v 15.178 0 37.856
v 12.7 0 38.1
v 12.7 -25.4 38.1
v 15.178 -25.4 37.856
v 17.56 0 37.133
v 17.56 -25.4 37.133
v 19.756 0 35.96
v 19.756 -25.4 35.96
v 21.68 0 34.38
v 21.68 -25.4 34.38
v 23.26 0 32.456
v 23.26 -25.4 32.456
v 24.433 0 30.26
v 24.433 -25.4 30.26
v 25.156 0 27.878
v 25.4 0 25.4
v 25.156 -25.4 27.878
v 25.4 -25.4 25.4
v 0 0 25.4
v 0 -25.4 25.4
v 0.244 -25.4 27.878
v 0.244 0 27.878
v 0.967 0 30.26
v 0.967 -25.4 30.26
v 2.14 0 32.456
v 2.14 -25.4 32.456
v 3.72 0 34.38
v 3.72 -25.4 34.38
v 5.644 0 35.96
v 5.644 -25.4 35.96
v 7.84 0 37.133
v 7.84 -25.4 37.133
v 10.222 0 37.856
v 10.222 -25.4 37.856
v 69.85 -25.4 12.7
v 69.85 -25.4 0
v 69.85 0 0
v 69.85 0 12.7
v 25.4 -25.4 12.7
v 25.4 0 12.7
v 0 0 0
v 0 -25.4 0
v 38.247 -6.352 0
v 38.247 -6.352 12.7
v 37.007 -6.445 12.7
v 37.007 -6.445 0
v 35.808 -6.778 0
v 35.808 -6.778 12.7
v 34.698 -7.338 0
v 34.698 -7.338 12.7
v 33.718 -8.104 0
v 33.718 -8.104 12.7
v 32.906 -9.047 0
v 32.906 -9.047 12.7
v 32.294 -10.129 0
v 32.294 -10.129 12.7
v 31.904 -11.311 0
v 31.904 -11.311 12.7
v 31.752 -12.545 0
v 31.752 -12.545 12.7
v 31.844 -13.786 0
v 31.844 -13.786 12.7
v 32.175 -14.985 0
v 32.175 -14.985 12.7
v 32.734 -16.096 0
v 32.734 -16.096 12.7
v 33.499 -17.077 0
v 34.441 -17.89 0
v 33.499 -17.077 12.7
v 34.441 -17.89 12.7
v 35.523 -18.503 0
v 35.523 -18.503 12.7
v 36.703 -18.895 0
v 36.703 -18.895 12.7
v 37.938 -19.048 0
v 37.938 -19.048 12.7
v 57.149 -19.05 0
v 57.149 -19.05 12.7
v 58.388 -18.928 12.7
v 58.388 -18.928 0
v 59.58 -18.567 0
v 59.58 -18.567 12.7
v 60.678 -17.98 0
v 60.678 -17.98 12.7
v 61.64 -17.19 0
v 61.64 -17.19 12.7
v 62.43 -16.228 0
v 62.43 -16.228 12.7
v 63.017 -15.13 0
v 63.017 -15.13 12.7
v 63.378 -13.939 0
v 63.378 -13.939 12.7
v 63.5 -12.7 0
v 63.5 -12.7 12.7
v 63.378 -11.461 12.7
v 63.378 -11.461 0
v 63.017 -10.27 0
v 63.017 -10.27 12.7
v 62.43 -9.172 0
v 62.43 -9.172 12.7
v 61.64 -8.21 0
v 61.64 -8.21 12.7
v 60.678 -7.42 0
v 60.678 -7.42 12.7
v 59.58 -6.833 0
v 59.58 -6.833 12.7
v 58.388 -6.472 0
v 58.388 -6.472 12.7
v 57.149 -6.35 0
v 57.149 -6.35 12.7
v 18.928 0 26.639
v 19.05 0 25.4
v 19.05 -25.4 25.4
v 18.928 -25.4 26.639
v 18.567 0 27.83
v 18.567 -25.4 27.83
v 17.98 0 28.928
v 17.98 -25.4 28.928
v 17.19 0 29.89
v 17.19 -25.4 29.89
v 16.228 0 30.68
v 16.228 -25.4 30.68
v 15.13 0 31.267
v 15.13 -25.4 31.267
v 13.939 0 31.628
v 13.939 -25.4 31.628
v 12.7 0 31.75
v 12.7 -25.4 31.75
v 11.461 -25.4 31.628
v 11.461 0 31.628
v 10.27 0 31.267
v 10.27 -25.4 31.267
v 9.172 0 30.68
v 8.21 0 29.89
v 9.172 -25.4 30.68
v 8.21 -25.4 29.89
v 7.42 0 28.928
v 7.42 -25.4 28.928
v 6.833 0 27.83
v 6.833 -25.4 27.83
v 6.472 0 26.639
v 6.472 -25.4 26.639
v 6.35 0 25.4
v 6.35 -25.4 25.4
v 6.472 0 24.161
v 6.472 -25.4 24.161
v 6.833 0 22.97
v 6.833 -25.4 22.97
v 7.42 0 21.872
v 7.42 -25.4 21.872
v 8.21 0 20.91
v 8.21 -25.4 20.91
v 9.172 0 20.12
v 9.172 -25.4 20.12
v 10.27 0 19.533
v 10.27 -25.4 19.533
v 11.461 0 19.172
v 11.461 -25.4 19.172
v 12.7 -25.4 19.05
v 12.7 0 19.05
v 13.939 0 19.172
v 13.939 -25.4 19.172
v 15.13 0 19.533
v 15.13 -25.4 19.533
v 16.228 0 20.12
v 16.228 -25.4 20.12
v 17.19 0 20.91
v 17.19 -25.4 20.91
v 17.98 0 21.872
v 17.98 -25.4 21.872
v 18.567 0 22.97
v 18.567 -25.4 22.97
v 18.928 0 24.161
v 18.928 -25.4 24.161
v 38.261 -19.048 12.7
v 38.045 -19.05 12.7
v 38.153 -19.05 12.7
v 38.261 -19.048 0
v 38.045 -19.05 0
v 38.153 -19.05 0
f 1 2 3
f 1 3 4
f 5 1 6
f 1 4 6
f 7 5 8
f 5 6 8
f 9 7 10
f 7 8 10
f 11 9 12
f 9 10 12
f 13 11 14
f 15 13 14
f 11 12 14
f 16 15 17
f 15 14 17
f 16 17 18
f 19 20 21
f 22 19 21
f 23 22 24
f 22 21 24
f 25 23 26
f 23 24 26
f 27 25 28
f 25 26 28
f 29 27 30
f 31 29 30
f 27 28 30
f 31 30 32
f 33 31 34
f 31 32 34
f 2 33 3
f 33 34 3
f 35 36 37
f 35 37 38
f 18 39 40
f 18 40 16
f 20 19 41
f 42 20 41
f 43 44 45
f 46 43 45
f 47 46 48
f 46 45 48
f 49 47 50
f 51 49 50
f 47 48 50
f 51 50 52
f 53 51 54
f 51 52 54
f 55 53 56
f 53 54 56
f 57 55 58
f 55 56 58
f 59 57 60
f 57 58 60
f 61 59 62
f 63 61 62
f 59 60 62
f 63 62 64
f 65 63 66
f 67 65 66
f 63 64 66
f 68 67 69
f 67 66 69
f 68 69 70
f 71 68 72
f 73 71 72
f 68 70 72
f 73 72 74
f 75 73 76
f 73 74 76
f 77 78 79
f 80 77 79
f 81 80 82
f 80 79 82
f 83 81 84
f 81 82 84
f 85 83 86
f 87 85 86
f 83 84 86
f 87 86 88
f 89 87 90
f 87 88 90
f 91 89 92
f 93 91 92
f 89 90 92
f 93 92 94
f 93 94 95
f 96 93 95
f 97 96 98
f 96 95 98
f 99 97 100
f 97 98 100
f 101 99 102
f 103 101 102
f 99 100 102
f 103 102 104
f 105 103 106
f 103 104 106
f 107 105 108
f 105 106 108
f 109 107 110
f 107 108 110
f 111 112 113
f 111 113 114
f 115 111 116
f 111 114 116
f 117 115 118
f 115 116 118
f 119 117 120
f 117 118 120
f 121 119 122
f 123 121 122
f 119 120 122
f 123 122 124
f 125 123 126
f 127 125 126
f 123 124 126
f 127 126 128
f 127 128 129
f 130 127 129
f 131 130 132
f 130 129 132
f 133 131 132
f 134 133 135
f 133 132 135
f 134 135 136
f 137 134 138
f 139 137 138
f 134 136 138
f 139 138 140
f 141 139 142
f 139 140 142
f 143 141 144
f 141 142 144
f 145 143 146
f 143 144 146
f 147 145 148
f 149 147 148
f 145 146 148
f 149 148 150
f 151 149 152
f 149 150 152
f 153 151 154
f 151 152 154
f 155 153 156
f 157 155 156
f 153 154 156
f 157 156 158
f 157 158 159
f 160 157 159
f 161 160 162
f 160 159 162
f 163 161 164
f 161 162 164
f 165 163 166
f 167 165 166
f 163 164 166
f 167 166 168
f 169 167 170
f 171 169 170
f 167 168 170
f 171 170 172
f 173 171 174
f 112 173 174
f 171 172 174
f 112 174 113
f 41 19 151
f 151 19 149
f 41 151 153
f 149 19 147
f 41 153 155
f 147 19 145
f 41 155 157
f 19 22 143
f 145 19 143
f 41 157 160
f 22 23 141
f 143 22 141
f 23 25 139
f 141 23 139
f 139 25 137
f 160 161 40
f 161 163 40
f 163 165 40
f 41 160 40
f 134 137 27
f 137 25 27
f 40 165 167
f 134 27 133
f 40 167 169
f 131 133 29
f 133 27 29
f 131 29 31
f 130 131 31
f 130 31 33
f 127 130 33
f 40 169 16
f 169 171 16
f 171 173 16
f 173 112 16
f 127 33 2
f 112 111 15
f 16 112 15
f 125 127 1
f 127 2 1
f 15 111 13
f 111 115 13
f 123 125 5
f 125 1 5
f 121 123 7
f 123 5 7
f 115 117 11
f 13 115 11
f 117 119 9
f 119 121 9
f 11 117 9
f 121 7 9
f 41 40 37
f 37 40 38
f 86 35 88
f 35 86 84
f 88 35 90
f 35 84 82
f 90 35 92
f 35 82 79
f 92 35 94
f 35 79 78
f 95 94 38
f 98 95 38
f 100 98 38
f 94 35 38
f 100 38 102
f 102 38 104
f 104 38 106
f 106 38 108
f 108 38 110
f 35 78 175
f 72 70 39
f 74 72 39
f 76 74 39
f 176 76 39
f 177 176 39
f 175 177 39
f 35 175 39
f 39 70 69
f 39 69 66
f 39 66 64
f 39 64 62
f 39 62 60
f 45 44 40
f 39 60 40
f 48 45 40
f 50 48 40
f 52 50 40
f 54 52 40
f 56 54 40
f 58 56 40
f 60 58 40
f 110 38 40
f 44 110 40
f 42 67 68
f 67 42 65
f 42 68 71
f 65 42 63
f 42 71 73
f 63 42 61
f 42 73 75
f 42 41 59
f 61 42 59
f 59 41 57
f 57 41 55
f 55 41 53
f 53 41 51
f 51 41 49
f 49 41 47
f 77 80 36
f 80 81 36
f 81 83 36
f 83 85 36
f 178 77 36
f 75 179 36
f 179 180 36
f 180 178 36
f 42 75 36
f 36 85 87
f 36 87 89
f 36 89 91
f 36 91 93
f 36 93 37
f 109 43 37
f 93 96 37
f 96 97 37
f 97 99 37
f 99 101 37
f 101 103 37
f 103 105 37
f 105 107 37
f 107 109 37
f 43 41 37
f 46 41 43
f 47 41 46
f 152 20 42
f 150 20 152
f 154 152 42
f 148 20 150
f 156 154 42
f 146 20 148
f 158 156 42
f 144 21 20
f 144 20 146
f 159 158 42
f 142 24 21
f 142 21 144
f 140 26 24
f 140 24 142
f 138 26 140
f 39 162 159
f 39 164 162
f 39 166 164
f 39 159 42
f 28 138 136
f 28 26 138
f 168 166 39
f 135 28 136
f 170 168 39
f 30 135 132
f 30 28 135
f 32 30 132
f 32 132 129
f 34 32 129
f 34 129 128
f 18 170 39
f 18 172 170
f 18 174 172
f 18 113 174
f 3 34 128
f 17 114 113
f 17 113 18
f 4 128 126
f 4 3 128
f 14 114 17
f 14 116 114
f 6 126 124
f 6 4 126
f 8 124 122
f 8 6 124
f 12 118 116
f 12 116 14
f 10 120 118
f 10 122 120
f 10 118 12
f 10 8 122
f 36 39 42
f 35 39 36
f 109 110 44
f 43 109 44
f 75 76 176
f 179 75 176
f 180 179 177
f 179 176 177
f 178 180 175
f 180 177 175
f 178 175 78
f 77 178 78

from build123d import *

# Parameters (mm, degrees)
F1_DEPTH = 25.4
F2_R     = 6.35
F3_DEPTH = 25.4
F4_DEPTH = 25.4
F7_DEPTH = 12.7


with BuildPart() as f1:
    # F0 (on Front) → F1 (new body)
    with BuildSketch(Plane.XZ):
        Polygon((25.4, 38.1), (0, 38.1), (0, 0), (69.85, 0), (69.85, 12.7), (25.4, 12.7), align=None)
    extrude(amount=F1_DEPTH)

    # F2 (on face) → F3 (cut)
    with BuildSketch(Plane.XZ.offset(25.4)):
        with Locations((12.7, 25.4)):
            Circle(F2_R)
    extrude(amount=-F3_DEPTH, mode=Mode.SUBTRACT)

    # F2 (on face) → F4 (cut)
    with BuildSketch(Plane.XZ.offset(25.4)):
        with BuildLine():
            ThreePointArc((0, 25.4), (3.719744, 34.380256), (12.7, 38.1))
            Line((12.7, 38.1), (0, 38.1))
            Line((0, 38.1), (0, 25.4))
        make_face()
        with BuildLine():
            ThreePointArc((12.7, 38.1), (21.680256, 34.380256), (25.4, 25.4))
            Line((25.4, 25.4), (25.4, 38.1))
            Line((25.4, 38.1), (12.7, 38.1))
        make_face()
    extrude(amount=-F4_DEPTH, mode=Mode.SUBTRACT)

    # F6 (on face) → F7 (cut)
    with BuildSketch(Plane.XY.offset(12.7)):
        with BuildLine():
            ThreePointArc((38.260814, -19.047963), (42.646629, -17.132907), (44.45, -12.7))
            ThreePointArc((44.45, -12.7), (42.64191, -8.262258), (38.247307, -6.351709))
            ThreePointArc((38.247307, -6.351709), (31.751886, -12.545255), (37.937817, -19.047929))
            Line((37.937817, -19.047929), (38.260814, -19.047963))
        make_face()
        with BuildLine():
            ThreePointArc((38.247307, -6.351709), (42.64191, -8.262258), (44.45, -12.7))
            ThreePointArc((44.45, -12.7), (42.646629, -17.132907), (38.260814, -19.047963))
            Line((38.260814, -19.047963), (57.149315, -19.05))
            ThreePointArc((57.149315, -19.05), (50.8, -12.699945), (57.149426, -6.35))
            Line((57.149426, -6.35), (38.247307, -6.351709))
        make_face()
        with BuildLine():
            ThreePointArc((37.937817, -19.047929), (38.099315, -19.05), (38.260814, -19.047963))
            Line((38.260814, -19.047963), (37.937817, -19.047929))
        make_face()
        with BuildLine():
            ThreePointArc((63.5, -12.7), (61.639925, -8.209669), (57.149426, -6.35))
            ThreePointArc((57.149426, -6.35), (50.8, -12.699945), (57.149315, -19.05))
            ThreePointArc((57.149315, -19.05), (61.639886, -17.19037), (63.5, -12.7))
        make_face()
    extrude(amount=-F7_DEPTH, mode=Mode.SUBTRACT)


solid = f1.part
